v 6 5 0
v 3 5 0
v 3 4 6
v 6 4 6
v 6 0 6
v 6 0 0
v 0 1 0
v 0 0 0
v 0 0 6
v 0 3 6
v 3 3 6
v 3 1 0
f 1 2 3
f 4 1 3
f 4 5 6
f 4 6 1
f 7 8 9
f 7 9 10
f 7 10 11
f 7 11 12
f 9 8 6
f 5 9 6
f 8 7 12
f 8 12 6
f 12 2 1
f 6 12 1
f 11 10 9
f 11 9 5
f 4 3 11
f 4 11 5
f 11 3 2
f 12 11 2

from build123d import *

# Parameters (mm, degrees)
SKETCH3_W           = 6
SKETCH3_H           = 5
BOSS_EXTRUDE6_DEPTH = 6
CUT_EXTRUDE4_DEPTH  = 6
CUT_EXTRUDE5_DEPTH  = 3


with BuildPart() as part:
    # Sketch3 → Boss-Extrude6 (new body)
    with BuildSketch(Plane.XY):
        with Locations((3, 2.5)):
            Rectangle(SKETCH3_W, SKETCH3_H)
    extrude(amount=BOSS_EXTRUDE6_DEPTH)

    # Sketch7 → Cut-Extrude4 (cut)
    with BuildSketch(Plane.ZY):
        Polygon((0, 5), (6, 4), (6, 5), align=None)
    extrude(amount=-CUT_EXTRUDE4_DEPTH, mode=Mode.SUBTRACT)

    # Sketch8 → Cut-Extrude5 (cut)
    with BuildSketch(Plane.ZY):
        Polygon((0, 5), (6, 4), (6, 3), (0, 1), align=None)
    extrude(amount=-CUT_EXTRUDE5_DEPTH, mode=Mode.SUBTRACT)


solid = part.part
